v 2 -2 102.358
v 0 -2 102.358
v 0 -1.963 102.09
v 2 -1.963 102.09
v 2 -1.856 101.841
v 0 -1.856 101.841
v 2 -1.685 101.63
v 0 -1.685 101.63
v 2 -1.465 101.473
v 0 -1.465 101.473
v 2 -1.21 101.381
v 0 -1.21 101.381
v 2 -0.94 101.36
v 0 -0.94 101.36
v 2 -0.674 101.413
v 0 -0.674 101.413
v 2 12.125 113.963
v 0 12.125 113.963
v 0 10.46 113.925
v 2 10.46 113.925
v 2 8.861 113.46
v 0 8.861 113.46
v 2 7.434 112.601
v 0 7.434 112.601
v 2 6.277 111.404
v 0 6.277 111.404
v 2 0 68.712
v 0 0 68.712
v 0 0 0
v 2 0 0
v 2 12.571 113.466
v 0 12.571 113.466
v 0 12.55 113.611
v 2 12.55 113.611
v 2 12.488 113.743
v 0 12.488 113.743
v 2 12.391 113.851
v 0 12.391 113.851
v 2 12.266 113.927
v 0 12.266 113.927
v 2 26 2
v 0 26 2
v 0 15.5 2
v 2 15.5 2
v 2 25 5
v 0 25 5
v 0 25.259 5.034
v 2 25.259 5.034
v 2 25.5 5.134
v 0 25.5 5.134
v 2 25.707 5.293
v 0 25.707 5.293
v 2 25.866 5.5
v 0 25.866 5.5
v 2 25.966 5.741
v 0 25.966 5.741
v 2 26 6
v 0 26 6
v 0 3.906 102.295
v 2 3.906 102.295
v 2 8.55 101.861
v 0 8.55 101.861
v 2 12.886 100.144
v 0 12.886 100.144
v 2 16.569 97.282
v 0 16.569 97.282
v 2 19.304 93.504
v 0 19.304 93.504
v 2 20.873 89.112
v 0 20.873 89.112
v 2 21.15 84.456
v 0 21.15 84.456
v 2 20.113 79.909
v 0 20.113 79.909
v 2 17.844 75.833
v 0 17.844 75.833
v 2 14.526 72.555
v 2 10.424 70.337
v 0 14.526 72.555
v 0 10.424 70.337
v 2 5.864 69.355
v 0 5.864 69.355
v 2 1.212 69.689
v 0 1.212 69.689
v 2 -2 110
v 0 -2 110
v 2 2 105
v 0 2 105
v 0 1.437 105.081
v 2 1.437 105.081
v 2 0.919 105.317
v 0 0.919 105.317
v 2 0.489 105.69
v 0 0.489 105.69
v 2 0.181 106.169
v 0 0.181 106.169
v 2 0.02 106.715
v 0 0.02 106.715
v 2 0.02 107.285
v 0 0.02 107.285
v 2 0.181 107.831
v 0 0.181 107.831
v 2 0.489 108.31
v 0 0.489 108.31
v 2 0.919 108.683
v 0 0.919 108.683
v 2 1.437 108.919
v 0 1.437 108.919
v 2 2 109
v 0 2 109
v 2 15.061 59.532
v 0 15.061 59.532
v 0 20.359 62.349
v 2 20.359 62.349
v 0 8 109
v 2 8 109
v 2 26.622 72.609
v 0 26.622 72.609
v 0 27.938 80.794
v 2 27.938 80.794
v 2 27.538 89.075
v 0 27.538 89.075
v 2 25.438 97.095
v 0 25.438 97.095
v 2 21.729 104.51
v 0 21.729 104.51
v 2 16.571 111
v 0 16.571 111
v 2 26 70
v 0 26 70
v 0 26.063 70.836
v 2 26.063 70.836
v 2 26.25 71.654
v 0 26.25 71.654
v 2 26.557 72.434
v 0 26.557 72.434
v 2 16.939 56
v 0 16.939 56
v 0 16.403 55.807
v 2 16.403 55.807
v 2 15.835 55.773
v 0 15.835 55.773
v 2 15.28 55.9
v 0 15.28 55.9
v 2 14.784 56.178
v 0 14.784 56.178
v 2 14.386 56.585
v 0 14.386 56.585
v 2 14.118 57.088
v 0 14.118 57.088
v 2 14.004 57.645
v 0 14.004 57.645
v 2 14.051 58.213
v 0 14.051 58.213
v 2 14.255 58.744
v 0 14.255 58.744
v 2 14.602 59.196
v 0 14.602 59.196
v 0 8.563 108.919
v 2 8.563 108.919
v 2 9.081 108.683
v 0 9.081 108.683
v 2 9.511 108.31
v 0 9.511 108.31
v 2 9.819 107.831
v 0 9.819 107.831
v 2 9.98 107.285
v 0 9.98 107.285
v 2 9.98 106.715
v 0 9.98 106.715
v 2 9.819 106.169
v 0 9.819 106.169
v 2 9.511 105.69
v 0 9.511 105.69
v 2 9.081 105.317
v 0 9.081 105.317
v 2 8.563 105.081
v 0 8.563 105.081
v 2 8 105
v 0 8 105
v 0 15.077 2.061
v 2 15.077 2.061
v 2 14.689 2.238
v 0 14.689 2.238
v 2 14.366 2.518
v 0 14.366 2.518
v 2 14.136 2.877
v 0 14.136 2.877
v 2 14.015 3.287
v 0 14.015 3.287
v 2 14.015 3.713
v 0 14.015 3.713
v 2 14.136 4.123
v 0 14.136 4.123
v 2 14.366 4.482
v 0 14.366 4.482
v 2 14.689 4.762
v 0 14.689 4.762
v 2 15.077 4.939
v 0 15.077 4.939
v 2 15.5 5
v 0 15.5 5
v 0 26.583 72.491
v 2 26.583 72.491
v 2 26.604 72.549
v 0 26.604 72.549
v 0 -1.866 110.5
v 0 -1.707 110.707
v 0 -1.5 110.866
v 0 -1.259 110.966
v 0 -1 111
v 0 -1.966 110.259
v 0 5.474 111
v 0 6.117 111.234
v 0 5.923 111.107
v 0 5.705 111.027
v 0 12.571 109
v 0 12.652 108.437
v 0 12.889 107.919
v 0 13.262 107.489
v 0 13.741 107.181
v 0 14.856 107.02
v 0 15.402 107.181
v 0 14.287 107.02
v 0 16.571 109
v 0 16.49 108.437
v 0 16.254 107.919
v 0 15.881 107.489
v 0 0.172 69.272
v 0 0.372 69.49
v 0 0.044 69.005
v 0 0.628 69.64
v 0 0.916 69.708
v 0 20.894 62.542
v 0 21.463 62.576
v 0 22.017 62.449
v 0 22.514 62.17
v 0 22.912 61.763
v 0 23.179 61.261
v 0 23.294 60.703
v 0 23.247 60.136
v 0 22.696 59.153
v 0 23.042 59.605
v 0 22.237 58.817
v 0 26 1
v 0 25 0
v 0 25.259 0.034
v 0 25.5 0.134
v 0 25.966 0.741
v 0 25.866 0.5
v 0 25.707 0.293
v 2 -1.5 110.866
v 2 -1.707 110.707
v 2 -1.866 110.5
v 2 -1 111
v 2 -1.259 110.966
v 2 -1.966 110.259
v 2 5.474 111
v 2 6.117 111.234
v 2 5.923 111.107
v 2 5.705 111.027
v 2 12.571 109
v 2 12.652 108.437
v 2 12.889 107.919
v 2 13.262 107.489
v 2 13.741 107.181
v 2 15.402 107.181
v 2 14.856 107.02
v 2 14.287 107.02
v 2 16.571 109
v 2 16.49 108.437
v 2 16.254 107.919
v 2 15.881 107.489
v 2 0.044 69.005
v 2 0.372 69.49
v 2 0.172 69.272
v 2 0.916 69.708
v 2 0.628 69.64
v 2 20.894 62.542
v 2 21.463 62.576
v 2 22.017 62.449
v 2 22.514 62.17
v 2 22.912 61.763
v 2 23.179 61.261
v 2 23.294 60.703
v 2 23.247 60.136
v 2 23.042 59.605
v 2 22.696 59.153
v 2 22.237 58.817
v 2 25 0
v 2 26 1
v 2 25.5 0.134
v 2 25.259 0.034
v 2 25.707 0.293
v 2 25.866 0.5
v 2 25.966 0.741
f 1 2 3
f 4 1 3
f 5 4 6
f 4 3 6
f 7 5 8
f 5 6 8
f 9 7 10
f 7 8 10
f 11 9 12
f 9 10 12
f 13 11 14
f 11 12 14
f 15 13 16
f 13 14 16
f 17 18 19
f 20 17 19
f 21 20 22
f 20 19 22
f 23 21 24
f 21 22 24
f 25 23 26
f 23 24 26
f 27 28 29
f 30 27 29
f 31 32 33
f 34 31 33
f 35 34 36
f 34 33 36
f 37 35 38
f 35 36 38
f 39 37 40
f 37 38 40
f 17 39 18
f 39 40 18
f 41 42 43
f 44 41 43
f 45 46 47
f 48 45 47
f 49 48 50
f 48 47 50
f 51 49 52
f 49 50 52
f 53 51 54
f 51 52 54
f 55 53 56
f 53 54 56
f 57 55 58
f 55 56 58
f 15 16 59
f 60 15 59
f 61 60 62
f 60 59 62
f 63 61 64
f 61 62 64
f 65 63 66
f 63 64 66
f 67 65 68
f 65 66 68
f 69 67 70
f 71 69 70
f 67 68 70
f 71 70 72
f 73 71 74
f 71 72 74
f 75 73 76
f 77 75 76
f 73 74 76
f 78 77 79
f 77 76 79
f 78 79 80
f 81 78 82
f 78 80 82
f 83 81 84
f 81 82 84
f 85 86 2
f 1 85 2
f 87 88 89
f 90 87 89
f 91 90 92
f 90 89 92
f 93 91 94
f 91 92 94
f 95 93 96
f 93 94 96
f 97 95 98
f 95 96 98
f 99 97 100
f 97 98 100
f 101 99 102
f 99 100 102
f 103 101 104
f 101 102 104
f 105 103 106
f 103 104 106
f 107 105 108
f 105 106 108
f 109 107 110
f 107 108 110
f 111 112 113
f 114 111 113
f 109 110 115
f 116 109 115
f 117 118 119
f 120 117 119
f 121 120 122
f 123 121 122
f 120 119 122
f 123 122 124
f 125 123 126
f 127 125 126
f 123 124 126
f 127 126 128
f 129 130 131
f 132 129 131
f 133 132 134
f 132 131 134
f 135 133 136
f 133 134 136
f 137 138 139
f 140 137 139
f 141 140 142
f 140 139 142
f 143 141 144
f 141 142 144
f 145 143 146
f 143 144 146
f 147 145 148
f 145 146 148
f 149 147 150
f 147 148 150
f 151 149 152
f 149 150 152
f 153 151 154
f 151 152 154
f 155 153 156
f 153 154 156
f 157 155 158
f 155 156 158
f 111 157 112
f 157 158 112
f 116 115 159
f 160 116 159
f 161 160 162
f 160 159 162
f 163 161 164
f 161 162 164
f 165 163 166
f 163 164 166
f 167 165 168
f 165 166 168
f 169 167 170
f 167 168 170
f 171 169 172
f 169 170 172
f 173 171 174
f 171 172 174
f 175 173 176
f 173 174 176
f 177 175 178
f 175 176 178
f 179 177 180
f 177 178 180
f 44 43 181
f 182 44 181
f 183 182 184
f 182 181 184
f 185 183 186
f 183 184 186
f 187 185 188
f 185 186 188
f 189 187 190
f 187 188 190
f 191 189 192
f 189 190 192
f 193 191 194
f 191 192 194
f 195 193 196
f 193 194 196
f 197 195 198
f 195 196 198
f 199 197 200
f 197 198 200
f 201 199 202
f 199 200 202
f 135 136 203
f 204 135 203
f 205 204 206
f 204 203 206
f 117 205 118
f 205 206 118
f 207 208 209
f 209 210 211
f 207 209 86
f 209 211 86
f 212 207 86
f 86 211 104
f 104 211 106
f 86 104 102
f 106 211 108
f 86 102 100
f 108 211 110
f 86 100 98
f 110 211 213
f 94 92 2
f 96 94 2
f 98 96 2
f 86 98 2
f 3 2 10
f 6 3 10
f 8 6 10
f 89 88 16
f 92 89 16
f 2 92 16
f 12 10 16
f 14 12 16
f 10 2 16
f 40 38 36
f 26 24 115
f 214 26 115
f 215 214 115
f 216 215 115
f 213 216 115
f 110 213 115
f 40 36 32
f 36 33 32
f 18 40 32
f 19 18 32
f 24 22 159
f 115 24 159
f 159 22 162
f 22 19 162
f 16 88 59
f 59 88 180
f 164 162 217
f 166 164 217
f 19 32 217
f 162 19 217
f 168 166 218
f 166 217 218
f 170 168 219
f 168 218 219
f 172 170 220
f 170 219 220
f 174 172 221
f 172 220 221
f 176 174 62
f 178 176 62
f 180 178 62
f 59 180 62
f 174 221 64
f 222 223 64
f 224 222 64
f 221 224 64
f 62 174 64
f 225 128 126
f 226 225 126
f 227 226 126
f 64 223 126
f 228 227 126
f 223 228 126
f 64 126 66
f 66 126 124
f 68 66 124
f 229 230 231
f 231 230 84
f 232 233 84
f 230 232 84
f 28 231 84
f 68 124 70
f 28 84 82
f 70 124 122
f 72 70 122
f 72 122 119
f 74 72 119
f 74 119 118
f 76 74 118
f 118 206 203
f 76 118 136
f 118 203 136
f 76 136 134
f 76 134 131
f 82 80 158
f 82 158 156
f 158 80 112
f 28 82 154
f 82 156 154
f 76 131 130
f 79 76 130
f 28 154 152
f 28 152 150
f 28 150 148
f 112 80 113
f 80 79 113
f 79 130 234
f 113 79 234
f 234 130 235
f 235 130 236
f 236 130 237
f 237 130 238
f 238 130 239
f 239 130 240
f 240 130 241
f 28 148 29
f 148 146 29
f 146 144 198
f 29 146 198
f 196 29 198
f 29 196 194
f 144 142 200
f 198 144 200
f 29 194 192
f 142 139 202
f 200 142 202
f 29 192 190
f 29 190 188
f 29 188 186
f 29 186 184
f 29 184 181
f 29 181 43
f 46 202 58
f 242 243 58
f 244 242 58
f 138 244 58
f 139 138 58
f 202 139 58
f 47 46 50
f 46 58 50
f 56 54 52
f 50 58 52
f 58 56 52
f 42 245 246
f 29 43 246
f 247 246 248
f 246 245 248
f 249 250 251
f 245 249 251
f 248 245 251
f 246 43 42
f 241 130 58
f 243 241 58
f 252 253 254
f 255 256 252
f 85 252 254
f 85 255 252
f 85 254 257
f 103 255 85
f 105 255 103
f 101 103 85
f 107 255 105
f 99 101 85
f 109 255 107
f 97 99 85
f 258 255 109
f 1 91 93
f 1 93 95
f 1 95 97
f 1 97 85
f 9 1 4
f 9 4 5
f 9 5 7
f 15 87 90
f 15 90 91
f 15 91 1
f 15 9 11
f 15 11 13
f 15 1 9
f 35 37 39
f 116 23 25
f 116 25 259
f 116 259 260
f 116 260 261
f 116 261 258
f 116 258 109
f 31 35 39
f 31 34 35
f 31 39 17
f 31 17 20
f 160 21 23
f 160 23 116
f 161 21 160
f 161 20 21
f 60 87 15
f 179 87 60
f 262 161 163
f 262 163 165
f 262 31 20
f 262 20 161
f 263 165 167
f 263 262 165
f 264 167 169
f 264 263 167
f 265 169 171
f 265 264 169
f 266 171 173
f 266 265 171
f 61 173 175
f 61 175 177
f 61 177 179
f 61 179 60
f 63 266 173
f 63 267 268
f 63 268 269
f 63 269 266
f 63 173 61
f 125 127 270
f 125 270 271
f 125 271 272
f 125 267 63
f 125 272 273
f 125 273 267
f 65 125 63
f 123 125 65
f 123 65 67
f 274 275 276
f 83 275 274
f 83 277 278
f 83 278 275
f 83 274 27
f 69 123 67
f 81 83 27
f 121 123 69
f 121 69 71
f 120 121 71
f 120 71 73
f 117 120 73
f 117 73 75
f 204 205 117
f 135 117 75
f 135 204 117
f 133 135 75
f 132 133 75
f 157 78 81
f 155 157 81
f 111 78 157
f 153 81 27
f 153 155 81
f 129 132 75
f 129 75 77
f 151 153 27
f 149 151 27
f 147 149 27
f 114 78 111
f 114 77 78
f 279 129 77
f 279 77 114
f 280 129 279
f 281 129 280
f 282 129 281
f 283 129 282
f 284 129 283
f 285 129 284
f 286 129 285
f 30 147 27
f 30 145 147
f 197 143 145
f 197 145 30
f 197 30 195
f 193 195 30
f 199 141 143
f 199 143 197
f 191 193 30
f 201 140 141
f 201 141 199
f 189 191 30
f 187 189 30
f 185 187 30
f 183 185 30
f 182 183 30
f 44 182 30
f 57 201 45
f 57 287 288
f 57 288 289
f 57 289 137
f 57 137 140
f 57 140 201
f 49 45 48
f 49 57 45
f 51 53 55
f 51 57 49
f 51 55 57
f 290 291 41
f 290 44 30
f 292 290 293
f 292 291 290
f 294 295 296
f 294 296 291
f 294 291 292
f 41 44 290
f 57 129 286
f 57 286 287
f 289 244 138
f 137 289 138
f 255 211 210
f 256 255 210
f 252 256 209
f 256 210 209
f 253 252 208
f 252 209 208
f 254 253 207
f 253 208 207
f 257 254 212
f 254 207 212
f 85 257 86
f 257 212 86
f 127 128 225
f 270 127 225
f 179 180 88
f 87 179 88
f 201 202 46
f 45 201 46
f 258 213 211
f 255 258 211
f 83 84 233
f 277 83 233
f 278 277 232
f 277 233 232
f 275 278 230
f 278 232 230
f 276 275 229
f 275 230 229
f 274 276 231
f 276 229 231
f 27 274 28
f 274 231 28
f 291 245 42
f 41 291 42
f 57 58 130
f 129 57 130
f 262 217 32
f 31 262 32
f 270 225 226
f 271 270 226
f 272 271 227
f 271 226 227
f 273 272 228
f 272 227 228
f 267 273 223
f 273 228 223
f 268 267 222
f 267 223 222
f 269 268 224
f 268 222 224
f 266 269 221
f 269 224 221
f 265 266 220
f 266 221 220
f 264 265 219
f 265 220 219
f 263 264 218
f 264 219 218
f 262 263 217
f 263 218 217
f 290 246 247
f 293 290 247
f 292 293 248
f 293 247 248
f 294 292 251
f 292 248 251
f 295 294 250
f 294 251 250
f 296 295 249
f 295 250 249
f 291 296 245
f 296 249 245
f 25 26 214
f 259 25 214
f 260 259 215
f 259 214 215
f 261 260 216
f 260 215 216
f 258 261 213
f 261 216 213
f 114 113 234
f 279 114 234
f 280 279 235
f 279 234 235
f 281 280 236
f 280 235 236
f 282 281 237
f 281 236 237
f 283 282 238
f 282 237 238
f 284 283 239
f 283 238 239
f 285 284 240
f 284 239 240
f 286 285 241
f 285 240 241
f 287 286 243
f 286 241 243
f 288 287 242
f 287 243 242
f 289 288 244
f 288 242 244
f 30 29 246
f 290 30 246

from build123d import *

# Parameters (mm, degrees)
RESSALTO_EXTRUS_O1_DEPTH = 2


with BuildPart() as part:
    # Esboço1 → Ressalto-extrusão1 (new body)
    with BuildSketch(Plane(origin=(0, 0, 0), x_dir=(0, 0, -1), z_dir=(1, 0, 0))):
        with BuildLine():
            Line((0, 0), (0, 25))
            ThreePointArc((0, 25), (-0.292893219, 25.707106781), (-1, 26))
            Line((-1, 26), (-2, 26))
            Line((-2, 26), (-2, 15.5))
            ThreePointArc((-2, 15.5), (-3.5, 14), (-5, 15.5))
            Line((-5, 15.5), (-5, 25))
            ThreePointArc((-5, 25), (-5.292893219, 25.707106781), (-6, 26))
            Line((-6, 26), (-70, 26))
            ThreePointArc((-70, 26), (-71.248507537, 26.141106905), (-72.434027777, 26.557308768))
            ThreePointArc((-72.434027777, 26.557308768), (-72.519947834, 26.593984538), (-72.608915487, 26.622482343))
            ThreePointArc((-72.608915487, 26.622482343), (-93.139545948, 26.696407833), (-111, 16.571367926))
            Line((-111, 16.571367926), (-109, 16.571367926))
            ThreePointArc((-109, 16.571367926), (-107, 14.571367926), (-109, 12.571367926))
            Line((-109, 12.571367926), (-113.466213279, 12.571367926))
            ThreePointArc((-113.466213279, 12.571367926), (-113.800393506, 12.443286702), (-113.963364883, 12.124662231))
            ThreePointArc((-113.963364883, 12.124662231), (-113.460397939, 8.860641338), (-111.403723296, 6.276671998))
            ThreePointArc((-111.403723296, 6.276671998), (-111.106614108, 5.923183177), (-111, 5.473893017))
            Line((-111, 5.473893017), (-111, -1))
            ThreePointArc((-111, -1), (-110.707106781, -1.707106781), (-110, -2))
            Line((-110, -2), (-102.358378421, -2))
            ThreePointArc((-102.358378421, -2), (-101.544115198, -1.580495826), (-101.413025617, -0.673950808))
            ThreePointArc((-101.413025617, -0.673950808), (-86.793753315, 21.176788674), (-69.688908754, 1.211763478))
            ThreePointArc((-69.688908754, 1.211763478), (-69.489971865, 0.372211611), (-68.711587809, 0))
            Line((-68.711587809, 0), (0, 0))
        make_face()
        with BuildLine():
            Line((-105, 8), (-105, 2))
            ThreePointArc((-105, 2), (-107, 0), (-109, 2))
            Line((-109, 2), (-109, 8))
            ThreePointArc((-109, 8), (-107, 10), (-105, 8))
        make_face(mode=Mode.SUBTRACT)
        with BuildLine():
            Line((-58.816829377, 22.236628683), (-56, 16.938943126))
            ThreePointArc((-56, 16.938943126), (-56.82695206, 14.234104814), (-59.531790371, 15.061056874))
            Line((-59.531790371, 15.061056874), (-62.348619748, 20.358742432))
            ThreePointArc((-62.348619748, 20.358742432), (-61.521667688, 23.063580743), (-58.816829377, 22.236628683))
        make_face(mode=Mode.SUBTRACT)
    extrude(amount=RESSALTO_EXTRUS_O1_DEPTH)


solid = part.part
